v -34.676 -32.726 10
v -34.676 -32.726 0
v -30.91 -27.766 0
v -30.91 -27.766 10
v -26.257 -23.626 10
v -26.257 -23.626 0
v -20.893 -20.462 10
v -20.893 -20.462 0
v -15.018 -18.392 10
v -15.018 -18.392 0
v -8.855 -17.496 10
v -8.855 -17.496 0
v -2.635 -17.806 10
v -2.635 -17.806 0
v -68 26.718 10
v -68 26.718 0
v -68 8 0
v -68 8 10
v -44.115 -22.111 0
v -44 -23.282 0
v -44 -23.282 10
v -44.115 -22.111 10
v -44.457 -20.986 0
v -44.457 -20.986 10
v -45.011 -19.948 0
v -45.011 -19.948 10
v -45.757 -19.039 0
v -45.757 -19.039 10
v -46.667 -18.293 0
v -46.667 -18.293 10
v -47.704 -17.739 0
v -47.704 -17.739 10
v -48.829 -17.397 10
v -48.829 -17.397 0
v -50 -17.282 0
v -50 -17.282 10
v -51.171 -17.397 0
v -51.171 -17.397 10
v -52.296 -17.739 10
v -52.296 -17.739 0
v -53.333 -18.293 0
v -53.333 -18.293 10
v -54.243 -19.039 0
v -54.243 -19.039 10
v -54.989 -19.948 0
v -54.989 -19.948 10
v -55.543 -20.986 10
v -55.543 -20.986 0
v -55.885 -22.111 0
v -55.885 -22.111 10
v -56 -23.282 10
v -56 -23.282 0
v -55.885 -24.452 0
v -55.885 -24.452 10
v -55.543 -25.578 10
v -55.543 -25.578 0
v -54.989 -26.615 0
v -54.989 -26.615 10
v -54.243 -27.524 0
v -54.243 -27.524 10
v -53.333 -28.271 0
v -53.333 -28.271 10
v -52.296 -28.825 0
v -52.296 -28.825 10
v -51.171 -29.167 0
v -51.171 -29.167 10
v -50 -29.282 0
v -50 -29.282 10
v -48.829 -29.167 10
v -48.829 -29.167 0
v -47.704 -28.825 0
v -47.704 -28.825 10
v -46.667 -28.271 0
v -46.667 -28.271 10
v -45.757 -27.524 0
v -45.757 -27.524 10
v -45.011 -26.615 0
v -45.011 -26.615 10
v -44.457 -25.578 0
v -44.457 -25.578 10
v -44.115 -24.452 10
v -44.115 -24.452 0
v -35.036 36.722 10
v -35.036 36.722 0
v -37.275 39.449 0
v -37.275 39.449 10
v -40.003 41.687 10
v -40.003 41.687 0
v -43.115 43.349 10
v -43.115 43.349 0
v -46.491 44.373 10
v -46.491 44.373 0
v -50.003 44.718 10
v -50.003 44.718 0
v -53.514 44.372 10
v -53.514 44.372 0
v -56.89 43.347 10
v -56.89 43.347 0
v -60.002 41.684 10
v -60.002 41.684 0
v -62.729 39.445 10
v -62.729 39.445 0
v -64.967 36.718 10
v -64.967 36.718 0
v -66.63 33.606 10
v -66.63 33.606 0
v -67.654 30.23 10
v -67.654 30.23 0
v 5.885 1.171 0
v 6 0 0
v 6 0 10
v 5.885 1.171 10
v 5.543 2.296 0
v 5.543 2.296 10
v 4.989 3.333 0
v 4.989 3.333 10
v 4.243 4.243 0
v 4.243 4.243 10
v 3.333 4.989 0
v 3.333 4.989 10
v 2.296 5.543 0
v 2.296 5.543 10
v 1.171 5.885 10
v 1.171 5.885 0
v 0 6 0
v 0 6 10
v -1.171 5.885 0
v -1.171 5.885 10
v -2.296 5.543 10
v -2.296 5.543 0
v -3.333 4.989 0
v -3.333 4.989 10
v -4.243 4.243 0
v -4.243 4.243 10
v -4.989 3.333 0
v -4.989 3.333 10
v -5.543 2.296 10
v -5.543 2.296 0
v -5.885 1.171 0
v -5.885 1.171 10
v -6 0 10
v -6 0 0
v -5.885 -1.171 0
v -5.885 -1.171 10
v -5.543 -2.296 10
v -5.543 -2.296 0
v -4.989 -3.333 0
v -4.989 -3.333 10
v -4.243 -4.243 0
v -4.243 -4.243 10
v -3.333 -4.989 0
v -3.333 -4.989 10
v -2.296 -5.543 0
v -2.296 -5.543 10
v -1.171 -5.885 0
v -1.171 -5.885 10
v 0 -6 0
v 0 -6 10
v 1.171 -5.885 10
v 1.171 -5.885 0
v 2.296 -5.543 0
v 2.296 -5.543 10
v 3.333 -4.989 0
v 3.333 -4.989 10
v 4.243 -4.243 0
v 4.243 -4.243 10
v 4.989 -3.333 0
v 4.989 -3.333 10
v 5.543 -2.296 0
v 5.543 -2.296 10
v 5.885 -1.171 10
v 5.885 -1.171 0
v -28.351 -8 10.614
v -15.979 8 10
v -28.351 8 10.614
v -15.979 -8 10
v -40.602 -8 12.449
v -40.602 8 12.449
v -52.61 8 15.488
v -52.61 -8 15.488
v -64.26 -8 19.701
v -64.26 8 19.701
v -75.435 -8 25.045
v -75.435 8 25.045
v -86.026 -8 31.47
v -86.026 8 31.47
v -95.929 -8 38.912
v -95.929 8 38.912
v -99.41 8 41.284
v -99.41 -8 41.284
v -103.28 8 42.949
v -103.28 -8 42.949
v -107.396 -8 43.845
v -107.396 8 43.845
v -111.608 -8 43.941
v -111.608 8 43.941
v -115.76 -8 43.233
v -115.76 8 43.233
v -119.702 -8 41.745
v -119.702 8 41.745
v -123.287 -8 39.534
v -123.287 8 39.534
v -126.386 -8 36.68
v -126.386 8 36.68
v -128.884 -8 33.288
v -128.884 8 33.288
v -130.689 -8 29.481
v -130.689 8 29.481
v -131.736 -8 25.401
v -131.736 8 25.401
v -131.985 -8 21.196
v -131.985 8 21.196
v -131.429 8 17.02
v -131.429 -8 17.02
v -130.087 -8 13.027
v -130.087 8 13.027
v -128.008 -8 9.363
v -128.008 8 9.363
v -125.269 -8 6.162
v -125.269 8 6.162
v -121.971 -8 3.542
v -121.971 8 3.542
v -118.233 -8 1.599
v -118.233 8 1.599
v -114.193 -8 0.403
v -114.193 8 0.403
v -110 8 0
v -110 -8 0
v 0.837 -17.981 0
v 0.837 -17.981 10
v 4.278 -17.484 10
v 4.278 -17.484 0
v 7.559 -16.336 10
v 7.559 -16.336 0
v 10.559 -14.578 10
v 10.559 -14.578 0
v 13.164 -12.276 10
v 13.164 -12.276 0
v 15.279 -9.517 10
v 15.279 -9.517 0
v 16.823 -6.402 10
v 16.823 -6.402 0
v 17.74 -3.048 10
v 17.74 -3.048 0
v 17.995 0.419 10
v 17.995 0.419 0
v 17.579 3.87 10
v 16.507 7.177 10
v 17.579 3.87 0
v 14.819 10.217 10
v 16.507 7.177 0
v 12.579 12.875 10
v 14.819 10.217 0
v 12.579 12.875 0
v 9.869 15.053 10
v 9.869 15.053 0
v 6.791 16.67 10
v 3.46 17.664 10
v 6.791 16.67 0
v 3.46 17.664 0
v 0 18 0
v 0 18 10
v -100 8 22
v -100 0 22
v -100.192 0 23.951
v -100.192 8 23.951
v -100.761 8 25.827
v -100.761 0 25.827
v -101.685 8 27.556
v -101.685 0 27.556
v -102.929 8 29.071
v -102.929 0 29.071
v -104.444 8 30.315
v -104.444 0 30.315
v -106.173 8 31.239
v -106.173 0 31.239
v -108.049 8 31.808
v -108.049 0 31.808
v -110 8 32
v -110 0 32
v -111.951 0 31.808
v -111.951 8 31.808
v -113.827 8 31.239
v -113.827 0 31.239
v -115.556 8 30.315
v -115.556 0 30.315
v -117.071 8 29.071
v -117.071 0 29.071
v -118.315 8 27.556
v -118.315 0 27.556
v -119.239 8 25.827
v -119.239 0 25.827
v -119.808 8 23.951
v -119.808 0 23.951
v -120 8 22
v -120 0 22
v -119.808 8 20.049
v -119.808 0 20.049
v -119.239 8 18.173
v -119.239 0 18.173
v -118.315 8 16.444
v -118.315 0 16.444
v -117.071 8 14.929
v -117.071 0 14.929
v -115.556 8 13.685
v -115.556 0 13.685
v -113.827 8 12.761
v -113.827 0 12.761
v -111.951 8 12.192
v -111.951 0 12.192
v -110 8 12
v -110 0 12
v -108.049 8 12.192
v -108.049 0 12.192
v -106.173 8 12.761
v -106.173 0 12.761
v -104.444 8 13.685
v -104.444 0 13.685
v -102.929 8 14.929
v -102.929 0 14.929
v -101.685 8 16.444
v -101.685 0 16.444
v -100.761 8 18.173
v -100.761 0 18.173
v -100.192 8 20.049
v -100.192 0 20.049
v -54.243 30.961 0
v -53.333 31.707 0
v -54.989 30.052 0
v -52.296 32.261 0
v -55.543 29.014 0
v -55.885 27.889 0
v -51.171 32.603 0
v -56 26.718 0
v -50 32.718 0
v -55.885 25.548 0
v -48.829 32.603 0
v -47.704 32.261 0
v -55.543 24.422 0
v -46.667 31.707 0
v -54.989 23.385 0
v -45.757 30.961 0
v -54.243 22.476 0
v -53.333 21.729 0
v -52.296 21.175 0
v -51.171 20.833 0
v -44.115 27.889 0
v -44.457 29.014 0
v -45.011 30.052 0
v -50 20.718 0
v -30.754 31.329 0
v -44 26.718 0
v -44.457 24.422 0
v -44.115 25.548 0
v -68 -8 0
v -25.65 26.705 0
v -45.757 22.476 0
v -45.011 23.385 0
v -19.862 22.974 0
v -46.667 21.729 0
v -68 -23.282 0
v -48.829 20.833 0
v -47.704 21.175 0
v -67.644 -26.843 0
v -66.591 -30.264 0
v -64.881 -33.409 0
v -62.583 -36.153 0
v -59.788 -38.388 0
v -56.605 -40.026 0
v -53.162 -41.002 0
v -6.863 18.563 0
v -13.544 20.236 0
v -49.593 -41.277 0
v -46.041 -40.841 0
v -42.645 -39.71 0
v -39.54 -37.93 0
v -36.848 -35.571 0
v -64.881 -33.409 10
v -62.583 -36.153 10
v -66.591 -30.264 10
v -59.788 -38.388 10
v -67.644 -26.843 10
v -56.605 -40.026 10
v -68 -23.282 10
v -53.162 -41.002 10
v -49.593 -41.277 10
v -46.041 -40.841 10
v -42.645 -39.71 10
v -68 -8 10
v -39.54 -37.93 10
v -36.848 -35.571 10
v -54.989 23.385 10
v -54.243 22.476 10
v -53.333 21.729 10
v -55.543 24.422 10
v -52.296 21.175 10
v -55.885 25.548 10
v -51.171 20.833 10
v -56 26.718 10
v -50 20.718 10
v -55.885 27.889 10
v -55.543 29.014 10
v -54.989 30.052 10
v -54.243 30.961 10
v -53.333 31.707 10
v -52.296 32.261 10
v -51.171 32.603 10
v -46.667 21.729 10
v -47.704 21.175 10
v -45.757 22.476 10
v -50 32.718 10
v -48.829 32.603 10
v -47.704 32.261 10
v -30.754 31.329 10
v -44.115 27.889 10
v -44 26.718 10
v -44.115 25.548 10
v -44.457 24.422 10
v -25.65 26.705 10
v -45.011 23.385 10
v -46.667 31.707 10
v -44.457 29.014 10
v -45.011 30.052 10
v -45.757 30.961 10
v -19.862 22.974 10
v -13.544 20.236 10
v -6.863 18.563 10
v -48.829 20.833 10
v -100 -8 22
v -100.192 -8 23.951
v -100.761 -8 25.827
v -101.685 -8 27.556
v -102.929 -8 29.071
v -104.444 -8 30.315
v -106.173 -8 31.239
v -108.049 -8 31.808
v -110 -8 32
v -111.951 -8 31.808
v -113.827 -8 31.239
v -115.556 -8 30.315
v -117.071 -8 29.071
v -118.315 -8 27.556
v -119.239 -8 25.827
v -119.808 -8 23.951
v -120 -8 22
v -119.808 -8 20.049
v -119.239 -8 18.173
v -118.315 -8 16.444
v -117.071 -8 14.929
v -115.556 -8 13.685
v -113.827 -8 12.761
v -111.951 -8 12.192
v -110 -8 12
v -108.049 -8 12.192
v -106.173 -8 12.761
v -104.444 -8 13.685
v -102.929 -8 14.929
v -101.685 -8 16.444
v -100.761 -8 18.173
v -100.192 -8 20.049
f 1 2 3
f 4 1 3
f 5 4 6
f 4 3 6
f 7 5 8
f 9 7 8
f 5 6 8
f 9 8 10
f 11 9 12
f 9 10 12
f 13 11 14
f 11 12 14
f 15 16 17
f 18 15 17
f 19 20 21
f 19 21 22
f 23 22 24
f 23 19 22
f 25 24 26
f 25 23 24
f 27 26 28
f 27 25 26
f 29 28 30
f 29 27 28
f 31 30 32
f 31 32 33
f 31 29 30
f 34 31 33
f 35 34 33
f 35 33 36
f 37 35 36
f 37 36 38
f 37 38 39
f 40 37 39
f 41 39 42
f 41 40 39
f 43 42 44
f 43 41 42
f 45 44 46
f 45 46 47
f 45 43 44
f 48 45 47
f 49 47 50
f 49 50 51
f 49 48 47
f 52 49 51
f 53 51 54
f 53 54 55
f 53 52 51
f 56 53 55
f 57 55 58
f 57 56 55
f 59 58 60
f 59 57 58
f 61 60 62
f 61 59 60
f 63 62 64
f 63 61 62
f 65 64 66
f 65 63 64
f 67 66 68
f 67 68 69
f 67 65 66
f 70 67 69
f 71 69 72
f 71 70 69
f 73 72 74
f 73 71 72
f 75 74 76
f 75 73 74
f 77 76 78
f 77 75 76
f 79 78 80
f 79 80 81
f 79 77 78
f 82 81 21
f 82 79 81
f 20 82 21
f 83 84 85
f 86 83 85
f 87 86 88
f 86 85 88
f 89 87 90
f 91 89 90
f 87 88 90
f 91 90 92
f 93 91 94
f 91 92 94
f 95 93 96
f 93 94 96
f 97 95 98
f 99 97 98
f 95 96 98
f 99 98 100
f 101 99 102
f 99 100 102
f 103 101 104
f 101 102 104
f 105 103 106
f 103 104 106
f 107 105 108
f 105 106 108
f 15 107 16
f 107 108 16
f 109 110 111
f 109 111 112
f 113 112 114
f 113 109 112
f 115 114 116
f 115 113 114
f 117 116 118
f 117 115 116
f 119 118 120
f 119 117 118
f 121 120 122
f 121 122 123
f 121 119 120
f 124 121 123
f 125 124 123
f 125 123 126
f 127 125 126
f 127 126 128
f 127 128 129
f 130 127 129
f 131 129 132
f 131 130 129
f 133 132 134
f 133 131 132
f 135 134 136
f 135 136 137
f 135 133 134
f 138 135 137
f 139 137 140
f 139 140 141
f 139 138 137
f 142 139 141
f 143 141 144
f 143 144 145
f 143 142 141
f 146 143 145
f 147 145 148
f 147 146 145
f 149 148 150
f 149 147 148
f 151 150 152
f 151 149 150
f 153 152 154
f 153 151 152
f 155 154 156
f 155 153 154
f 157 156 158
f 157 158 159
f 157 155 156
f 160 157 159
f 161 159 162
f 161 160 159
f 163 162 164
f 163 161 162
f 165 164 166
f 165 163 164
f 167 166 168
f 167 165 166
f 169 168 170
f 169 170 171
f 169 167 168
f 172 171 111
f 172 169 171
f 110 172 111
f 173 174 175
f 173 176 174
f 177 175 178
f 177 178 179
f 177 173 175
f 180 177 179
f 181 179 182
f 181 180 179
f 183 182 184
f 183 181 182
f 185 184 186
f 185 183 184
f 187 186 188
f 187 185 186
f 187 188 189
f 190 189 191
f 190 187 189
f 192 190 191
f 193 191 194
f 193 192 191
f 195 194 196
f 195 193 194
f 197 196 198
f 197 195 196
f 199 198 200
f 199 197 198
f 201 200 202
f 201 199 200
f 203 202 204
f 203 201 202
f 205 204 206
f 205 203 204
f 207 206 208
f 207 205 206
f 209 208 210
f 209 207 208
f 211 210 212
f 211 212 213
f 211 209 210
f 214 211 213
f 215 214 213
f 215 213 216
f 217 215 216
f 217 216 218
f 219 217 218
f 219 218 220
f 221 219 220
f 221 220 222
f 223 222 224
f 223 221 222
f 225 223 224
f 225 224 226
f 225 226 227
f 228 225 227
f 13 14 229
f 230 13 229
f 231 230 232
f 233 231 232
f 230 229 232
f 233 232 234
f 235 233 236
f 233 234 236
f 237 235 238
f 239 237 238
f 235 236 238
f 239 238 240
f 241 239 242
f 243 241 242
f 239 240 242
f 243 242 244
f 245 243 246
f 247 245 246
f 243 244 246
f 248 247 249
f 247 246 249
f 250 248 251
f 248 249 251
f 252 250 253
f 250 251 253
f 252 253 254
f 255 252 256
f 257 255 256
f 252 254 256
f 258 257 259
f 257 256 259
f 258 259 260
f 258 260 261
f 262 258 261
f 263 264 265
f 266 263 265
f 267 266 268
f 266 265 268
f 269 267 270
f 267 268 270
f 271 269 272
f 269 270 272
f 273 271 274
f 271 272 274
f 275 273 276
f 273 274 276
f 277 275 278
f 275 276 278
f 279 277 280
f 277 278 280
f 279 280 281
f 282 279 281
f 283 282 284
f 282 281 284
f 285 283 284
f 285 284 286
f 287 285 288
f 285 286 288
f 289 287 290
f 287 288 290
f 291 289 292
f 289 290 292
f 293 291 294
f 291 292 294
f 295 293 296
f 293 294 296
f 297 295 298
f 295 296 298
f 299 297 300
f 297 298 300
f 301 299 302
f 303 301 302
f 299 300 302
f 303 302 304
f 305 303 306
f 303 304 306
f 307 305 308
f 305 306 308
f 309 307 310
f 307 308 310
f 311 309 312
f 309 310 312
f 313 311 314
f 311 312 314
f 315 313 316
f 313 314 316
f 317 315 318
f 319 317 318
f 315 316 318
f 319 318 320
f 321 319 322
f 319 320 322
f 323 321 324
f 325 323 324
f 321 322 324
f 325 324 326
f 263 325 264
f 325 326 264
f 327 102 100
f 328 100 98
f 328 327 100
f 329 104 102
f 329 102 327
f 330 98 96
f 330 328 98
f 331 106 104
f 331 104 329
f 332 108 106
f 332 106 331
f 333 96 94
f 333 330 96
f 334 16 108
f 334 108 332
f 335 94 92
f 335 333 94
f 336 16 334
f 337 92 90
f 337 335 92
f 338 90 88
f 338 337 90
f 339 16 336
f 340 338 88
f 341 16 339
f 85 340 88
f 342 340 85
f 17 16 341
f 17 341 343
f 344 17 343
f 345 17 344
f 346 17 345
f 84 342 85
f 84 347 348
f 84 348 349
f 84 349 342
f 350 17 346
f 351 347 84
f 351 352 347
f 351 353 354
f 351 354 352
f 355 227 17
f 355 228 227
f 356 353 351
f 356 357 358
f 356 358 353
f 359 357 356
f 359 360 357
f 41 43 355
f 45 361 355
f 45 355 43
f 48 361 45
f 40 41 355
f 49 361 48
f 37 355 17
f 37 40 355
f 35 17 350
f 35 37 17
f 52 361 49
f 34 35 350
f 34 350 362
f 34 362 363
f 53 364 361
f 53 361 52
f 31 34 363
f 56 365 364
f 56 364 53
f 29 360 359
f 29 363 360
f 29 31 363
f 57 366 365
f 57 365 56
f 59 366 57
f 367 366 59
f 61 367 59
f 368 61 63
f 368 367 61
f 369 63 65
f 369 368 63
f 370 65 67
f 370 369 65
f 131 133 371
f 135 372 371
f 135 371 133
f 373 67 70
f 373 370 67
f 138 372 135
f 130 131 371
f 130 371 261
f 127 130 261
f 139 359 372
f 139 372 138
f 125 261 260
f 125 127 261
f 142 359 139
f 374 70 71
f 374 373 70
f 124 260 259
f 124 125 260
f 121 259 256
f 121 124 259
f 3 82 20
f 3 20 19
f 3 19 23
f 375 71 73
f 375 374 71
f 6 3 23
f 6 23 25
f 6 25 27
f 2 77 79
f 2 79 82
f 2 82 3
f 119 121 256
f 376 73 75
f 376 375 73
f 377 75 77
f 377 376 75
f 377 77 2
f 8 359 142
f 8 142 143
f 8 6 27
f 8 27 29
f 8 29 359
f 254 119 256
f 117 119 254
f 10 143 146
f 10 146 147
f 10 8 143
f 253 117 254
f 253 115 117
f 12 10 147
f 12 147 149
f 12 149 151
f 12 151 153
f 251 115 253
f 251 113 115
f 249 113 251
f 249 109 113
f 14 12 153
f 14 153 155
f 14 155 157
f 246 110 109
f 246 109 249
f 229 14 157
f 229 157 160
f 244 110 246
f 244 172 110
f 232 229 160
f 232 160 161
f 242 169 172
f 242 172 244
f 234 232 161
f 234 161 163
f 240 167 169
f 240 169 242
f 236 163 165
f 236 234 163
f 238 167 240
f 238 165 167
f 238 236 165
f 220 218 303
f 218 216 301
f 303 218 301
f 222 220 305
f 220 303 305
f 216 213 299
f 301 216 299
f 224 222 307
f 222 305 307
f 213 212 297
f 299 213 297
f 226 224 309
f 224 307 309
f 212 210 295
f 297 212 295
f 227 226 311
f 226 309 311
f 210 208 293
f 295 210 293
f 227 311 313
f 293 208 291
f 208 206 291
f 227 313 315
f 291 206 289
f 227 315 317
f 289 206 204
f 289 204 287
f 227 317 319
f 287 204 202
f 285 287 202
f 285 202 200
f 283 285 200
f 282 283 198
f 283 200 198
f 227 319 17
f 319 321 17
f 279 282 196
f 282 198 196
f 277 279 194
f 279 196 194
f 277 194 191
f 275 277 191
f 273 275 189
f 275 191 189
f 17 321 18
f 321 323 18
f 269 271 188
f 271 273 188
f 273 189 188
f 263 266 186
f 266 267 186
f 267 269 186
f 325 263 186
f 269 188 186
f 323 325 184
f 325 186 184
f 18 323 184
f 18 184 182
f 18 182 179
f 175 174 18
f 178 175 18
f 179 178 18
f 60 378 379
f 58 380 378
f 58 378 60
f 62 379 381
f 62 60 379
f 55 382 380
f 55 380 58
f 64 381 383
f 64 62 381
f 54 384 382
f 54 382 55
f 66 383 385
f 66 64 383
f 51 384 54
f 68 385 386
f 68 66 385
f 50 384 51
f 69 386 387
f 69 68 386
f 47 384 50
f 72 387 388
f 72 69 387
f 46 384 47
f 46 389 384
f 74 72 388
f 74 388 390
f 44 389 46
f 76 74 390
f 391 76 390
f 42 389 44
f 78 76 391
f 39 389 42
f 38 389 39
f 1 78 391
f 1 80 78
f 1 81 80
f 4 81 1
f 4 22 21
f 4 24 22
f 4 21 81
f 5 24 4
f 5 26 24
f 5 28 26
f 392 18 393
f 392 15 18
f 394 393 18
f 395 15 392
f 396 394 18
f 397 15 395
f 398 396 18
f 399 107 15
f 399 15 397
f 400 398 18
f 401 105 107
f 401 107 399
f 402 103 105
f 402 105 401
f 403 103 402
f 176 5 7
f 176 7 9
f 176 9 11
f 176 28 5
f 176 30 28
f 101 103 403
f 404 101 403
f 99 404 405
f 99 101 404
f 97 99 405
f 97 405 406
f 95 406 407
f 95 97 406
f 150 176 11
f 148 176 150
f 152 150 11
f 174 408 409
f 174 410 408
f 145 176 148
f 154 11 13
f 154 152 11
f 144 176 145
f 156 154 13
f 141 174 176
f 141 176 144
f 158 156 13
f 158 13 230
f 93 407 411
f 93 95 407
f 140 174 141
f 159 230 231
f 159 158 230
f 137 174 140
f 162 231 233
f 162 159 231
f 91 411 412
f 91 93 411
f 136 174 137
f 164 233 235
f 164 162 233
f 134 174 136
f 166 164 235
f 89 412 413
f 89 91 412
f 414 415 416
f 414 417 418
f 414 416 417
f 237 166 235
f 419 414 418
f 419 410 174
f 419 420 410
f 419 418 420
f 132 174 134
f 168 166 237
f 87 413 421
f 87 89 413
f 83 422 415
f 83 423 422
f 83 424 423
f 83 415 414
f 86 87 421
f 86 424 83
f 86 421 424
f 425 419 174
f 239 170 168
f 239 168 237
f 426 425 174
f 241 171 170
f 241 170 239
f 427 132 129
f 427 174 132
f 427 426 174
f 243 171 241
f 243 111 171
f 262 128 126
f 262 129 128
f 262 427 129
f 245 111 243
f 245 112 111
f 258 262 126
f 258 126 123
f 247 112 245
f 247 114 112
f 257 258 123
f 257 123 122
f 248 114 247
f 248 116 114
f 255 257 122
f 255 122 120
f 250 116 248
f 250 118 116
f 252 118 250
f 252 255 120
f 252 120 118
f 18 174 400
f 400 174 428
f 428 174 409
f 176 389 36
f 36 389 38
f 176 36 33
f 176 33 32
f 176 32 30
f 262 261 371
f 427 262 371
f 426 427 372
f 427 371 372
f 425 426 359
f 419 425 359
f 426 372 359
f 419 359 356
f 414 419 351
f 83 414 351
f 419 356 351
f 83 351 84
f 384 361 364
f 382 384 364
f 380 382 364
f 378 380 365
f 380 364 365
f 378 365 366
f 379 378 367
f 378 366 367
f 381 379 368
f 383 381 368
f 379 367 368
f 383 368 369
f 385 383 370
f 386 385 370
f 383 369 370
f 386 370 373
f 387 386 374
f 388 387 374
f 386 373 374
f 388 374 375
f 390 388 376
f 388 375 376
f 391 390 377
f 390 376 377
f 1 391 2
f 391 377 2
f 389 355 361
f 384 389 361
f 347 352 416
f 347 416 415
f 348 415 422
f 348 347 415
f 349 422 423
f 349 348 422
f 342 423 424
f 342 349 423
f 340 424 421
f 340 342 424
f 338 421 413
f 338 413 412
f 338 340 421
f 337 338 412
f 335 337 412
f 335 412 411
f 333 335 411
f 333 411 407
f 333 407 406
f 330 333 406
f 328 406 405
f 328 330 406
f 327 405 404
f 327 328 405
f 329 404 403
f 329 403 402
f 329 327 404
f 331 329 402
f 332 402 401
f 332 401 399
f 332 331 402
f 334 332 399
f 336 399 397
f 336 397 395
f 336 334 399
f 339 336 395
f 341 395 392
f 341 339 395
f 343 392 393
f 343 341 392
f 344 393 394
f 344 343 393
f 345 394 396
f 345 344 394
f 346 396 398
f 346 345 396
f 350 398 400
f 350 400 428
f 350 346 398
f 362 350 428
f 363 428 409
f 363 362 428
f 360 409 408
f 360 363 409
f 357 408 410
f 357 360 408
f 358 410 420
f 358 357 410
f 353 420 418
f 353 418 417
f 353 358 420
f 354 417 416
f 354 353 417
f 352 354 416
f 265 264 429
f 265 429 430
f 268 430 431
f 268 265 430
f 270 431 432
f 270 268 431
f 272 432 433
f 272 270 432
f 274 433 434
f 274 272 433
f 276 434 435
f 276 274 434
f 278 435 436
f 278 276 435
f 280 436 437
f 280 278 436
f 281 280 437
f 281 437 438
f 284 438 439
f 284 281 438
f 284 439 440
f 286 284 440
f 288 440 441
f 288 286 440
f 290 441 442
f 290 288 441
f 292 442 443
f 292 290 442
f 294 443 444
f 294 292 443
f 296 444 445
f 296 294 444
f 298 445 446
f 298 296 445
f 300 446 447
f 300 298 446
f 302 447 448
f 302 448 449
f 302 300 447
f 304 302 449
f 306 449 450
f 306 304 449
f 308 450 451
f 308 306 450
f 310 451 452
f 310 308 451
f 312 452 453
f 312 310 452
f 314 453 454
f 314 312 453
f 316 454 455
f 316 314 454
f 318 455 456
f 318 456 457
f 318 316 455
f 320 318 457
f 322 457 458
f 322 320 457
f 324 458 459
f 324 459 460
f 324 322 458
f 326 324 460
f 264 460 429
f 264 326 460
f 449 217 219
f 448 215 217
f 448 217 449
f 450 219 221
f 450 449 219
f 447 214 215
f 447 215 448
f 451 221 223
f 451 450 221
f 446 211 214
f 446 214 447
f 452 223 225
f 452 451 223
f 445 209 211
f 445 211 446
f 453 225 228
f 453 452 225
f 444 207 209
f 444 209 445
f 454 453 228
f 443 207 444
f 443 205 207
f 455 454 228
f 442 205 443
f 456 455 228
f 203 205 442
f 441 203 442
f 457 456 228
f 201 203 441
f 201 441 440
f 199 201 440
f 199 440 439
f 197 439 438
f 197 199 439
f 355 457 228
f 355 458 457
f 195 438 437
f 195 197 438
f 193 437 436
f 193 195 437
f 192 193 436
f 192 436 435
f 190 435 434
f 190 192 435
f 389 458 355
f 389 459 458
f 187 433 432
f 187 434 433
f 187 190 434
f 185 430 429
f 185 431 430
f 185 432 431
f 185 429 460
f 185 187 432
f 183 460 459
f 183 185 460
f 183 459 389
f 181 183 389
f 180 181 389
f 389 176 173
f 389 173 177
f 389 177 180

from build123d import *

# Parameters (mm, degrees)
F0_R          = 6
F1_DEPTH      = 10
F2_R          = 10
F3_DEPTH      = 8
F3_DEPTH_BACK = 8


with BuildPart() as f1:
    # F0 (on Top) → F1 (new body)
    with BuildSketch(Plane.XY):
        with BuildLine():
            ThreePointArc((-34.676423, -32.725742), (-20.892766, -20.461597), (-2.634981, -17.806091))
            ThreePointArc((-2.634981, -17.806091), (17.951457, -1.321053), (0, 18))
            ThreePointArc((0, 18), (-19.862144, 22.974), (-35.035837, 36.721888))
            ThreePointArc((-35.035837, 36.721888), (-55.227096, 43.942524), (-68, 26.718197))
            Line((-68, 26.718197), (-68, -23.281803))
            ThreePointArc((-68, -23.281803), (-54.907933, -40.599777), (-34.676423, -32.725742))
        make_face()
        with Locations((-50, -23.281803)):
            Circle(F0_R, mode=Mode.SUBTRACT)
        Circle(F0_R, mode=Mode.SUBTRACT)
        with Locations((-50, 26.718197)):
            Circle(F0_R, mode=Mode.SUBTRACT)
    extrude(amount=F1_DEPTH)

    # F2 (on Front) → F3 (join, two sides)
    with BuildSketch(Plane.XZ) as f3_sk:
        with BuildLine():
            ThreePointArc((-15.978726, 10), (-58.487228, 17.449895), (-95.928789, 38.911565))
            ThreePointArc((-95.928789, 38.911565), (-130.688818, 29.481496), (-110, 0))
            Line((-110, 0), (-15.978726, 0))
            Line((-15.978726, 0), (-15.978726, 10))
        make_face()
        with Locations((-110, 22)):
            Circle(F2_R, mode=Mode.SUBTRACT)
    extrude(amount=F3_DEPTH)
    extrude(f3_sk.sketch, amount=-F3_DEPTH_BACK)


solid = f1.part
